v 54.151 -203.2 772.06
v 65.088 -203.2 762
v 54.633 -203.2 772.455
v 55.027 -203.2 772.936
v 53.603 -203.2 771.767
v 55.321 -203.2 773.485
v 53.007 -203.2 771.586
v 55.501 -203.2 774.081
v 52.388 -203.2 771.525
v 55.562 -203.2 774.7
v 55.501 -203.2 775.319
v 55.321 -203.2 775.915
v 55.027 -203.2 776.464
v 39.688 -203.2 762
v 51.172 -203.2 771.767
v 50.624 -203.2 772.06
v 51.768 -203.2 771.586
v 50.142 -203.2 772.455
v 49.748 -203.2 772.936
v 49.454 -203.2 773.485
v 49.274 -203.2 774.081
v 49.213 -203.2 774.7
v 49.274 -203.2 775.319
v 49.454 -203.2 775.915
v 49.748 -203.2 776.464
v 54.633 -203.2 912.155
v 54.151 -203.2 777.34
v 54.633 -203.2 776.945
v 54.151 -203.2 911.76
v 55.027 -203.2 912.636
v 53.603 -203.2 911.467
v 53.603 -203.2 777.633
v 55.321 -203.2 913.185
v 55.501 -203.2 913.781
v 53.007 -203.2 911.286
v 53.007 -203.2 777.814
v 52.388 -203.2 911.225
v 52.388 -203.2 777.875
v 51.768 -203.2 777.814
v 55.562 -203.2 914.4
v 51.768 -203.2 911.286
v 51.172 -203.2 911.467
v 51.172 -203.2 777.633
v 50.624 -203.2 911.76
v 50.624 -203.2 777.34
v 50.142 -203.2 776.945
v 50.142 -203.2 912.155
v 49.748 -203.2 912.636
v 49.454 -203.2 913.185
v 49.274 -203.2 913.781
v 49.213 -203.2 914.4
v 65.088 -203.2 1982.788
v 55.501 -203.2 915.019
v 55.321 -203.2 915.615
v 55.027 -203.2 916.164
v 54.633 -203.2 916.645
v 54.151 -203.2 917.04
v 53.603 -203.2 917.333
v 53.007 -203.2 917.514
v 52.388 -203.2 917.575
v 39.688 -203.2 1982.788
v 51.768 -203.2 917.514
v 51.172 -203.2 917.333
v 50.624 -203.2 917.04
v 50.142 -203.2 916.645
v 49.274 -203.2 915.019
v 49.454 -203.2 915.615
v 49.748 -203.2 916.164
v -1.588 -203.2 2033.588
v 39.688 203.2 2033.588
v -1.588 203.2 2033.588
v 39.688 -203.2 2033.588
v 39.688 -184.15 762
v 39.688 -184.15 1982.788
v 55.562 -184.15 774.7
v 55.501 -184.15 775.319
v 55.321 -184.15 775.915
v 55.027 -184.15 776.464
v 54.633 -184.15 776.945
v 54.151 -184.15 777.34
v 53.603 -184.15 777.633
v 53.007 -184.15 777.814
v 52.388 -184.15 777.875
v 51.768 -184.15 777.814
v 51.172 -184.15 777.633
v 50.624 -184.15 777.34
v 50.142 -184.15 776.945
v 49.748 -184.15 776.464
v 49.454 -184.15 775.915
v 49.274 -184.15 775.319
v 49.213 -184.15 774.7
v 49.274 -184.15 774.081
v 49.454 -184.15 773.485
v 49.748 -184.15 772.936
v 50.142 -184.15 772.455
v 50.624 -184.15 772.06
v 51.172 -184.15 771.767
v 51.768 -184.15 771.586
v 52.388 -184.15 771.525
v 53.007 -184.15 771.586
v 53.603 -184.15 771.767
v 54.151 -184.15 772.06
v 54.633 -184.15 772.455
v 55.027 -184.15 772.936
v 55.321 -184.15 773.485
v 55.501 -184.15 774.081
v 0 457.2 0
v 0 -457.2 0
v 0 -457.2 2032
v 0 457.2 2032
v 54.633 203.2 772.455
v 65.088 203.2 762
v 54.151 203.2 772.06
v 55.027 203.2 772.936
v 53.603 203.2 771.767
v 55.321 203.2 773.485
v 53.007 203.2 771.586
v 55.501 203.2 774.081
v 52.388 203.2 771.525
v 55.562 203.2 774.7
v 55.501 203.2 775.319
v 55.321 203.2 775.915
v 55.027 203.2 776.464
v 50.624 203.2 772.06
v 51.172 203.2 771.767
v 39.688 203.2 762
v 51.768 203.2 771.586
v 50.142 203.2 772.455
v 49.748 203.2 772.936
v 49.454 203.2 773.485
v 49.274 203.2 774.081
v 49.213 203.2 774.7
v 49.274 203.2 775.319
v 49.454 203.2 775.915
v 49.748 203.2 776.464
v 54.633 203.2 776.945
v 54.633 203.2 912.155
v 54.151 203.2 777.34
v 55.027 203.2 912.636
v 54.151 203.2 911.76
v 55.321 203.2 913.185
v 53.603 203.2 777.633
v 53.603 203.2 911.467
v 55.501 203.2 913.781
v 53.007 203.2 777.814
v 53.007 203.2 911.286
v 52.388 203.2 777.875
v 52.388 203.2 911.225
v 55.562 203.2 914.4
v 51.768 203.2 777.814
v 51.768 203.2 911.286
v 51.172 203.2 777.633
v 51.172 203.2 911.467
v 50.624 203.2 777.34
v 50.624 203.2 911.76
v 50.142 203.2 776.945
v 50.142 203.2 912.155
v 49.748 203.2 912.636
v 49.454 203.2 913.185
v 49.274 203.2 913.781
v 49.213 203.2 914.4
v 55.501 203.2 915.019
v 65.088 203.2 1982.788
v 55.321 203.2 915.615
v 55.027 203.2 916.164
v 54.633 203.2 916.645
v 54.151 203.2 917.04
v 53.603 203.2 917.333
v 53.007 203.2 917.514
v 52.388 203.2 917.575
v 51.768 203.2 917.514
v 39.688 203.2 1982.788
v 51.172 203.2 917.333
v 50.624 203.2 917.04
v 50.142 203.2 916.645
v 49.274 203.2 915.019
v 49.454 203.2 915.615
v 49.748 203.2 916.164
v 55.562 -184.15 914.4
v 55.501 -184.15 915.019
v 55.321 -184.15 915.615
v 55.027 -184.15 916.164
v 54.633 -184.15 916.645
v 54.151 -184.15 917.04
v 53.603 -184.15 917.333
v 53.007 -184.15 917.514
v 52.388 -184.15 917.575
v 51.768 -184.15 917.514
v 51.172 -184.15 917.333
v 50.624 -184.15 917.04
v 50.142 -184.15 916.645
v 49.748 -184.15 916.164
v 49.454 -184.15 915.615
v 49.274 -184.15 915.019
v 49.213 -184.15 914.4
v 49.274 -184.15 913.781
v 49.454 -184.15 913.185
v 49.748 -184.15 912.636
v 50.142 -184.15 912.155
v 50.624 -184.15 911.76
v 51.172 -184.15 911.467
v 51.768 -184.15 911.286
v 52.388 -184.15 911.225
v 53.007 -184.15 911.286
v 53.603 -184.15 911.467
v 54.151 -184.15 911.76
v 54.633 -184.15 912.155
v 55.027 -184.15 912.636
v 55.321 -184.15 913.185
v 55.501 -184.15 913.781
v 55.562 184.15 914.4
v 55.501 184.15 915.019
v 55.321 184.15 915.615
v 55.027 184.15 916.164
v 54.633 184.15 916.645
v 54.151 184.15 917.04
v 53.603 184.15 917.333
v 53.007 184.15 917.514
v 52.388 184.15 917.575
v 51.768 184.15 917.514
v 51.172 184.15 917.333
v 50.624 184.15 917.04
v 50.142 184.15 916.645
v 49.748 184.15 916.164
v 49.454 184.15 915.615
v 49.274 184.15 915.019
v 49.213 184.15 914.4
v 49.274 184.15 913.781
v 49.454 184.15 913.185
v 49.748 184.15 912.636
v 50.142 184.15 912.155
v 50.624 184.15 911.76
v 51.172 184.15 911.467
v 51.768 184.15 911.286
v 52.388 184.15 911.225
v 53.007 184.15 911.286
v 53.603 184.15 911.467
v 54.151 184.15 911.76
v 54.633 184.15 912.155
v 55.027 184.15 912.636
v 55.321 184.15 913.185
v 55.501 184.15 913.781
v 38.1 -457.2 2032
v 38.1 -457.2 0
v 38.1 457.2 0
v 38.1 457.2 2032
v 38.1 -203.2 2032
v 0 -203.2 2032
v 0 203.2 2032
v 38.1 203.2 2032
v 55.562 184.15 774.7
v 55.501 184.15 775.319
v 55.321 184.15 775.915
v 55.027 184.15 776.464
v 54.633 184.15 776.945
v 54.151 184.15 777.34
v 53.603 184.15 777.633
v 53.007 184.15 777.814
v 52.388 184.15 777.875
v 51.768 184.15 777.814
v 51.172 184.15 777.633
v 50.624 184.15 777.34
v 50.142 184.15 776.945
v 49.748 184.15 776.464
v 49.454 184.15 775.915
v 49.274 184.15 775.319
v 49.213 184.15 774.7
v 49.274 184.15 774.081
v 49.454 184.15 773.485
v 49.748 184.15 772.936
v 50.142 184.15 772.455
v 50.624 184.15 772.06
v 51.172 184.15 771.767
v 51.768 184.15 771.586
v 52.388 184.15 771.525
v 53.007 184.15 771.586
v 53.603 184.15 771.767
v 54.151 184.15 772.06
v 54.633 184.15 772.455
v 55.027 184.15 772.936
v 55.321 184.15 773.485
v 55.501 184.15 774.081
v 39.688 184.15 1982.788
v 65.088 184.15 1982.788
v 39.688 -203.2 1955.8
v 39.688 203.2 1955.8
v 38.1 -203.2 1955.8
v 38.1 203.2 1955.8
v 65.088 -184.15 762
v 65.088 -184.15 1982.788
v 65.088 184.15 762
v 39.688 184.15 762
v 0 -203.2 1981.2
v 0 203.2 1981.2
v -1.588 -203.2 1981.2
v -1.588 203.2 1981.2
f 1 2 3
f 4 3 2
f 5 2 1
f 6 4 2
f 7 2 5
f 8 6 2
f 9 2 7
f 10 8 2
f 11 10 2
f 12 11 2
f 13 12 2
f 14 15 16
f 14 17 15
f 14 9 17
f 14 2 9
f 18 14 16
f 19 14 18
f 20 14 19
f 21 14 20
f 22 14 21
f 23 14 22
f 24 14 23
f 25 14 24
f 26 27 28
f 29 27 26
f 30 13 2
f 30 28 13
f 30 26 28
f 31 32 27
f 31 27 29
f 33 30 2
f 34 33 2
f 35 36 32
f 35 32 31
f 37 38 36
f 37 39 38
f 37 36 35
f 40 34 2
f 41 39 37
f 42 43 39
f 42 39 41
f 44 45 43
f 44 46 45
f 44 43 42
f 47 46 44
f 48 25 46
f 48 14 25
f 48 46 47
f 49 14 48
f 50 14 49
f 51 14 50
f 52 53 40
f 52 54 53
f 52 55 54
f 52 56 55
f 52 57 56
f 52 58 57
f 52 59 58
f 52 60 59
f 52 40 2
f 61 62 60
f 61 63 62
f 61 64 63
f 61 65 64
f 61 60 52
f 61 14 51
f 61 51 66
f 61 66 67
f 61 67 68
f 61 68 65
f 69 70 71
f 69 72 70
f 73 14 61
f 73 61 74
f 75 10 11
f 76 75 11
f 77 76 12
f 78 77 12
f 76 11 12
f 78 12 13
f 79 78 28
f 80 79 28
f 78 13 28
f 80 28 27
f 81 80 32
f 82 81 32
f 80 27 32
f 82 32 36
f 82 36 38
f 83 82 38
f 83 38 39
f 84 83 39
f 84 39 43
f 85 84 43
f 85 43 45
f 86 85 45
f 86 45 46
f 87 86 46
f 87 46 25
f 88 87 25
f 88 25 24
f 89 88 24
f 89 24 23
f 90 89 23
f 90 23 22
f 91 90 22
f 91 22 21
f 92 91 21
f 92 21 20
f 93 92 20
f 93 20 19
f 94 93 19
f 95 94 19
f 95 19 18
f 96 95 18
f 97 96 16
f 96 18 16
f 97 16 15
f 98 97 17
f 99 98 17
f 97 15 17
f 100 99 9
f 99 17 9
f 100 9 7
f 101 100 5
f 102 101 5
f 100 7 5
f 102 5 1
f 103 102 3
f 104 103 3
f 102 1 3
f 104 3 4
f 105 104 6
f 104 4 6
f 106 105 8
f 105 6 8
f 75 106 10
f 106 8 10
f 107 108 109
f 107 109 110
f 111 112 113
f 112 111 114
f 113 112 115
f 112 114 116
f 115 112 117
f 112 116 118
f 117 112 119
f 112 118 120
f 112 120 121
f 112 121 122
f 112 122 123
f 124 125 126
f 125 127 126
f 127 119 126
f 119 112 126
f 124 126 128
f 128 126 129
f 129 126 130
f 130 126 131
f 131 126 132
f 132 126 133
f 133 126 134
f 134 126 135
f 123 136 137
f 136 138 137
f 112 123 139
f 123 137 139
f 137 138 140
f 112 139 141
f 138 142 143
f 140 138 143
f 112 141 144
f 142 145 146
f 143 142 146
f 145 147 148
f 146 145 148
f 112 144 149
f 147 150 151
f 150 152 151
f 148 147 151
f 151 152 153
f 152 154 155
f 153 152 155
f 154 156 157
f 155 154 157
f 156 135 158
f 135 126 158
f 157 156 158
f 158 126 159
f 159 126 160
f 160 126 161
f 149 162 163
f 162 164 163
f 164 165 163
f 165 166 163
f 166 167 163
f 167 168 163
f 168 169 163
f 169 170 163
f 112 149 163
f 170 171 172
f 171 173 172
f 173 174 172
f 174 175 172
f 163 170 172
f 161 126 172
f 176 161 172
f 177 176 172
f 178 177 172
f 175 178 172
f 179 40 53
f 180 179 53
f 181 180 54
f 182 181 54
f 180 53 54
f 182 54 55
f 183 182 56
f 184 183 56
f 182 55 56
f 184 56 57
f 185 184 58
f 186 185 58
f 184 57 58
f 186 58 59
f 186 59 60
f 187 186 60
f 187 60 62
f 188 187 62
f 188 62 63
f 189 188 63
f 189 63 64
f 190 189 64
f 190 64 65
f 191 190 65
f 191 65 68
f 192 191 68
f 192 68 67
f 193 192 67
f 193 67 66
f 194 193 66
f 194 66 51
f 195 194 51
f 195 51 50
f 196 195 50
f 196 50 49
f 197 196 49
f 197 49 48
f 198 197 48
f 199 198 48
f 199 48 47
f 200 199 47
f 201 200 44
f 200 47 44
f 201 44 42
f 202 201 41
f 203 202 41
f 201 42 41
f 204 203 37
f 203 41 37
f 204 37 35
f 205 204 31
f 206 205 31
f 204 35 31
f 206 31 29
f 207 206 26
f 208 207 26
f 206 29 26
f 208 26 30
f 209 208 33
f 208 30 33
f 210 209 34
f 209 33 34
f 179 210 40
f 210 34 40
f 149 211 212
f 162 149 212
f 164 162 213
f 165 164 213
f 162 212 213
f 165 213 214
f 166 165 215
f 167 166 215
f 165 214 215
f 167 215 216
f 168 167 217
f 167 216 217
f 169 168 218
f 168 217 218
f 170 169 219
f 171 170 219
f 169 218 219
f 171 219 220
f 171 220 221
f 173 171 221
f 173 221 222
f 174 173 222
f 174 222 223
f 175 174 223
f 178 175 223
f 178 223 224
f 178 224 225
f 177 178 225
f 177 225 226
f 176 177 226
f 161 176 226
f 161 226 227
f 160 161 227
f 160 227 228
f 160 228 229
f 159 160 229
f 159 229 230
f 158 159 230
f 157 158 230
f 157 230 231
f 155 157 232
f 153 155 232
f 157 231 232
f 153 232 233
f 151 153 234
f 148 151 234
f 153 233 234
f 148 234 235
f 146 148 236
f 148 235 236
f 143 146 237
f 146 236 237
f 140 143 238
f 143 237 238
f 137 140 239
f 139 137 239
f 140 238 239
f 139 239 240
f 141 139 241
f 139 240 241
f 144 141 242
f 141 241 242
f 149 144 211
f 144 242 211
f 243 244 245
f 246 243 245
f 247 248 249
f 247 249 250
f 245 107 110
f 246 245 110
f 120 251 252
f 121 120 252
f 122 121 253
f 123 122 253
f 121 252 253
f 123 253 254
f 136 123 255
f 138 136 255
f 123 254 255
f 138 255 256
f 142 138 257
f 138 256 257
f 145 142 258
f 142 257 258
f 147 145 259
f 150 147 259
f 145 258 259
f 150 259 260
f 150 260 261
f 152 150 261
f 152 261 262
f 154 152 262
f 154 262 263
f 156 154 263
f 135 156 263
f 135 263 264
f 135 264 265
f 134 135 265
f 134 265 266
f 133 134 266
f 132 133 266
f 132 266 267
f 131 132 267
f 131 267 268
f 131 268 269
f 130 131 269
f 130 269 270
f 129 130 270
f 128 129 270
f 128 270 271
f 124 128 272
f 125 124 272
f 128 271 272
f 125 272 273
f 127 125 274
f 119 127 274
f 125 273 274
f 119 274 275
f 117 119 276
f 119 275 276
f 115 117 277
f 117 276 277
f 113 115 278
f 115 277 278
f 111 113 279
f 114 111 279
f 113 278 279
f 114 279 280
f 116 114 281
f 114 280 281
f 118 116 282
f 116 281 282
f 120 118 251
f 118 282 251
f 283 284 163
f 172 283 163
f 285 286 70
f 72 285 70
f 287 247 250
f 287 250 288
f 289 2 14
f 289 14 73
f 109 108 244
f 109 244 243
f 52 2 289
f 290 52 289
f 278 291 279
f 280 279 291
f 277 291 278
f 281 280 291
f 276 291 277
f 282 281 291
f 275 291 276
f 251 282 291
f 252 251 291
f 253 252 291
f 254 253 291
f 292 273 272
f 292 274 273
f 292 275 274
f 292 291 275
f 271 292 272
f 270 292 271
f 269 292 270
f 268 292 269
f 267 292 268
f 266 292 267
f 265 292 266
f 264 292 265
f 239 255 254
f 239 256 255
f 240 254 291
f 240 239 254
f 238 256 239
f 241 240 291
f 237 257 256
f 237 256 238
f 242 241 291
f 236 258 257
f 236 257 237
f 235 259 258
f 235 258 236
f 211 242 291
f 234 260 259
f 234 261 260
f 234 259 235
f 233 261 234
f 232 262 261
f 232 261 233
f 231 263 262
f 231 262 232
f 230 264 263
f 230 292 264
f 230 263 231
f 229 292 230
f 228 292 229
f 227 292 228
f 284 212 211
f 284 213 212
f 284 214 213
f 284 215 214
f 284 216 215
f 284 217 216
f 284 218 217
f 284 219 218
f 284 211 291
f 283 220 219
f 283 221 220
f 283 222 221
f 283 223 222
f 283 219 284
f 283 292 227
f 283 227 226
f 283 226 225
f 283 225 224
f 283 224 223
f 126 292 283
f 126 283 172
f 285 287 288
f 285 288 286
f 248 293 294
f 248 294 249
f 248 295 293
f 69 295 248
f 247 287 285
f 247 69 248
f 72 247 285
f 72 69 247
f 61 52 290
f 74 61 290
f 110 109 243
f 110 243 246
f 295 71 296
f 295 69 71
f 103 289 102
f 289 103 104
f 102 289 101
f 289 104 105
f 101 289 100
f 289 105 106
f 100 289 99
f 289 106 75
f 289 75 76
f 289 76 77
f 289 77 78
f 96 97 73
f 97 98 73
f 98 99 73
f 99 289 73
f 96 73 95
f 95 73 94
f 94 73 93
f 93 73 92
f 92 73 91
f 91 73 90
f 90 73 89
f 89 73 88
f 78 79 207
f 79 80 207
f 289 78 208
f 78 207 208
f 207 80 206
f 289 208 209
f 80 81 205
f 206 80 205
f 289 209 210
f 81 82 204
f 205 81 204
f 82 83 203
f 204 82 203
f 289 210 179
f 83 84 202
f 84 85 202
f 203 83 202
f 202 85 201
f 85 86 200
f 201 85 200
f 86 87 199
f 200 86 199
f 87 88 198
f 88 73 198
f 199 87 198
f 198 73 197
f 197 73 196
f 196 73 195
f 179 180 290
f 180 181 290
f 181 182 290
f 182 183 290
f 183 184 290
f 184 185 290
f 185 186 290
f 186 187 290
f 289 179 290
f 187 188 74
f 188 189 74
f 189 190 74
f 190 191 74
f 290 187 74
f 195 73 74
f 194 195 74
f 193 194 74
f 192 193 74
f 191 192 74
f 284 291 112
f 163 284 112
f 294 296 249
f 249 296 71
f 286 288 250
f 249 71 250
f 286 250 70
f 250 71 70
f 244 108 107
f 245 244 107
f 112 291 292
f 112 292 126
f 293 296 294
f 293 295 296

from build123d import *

# Parameters (mm, degrees)
F0_W     = 914.4
F0_H     = 2032
F1_DEPTH = 38.1
F3_DEPTH = 203.2
F4_W     = 19.05
F4_H     = 1220.7875
F5_DEPTH = 25.4
F6_R     = 3.175
F7_DEPTH = 660.401


with BuildPart() as f1:
    # F0 (on Right) → F1 (new body)
    with BuildSketch(Plane.YZ):
        with Locations((0, 1016)):
            Rectangle(F0_W, F0_H)
    extrude(amount=F1_DEPTH)


with BuildPart() as f3:
    # F2 (on Front) → F3 (new body, symmetric)
    with BuildSketch(Plane.XZ):
        Polygon((-1.5875, 1981.2), (0, 1981.2), (0, 2032), (38.1, 2032), (38.1, 1955.8), (39.6875, 1955.8), (39.6875, 2033.5875), (-1.5875, 2033.5875), align=None)
    extrude(amount=F3_DEPTH, both=True)


with BuildPart() as f5:
    # F4 (on face) → F5 (new body)
    with BuildSketch(Plane.YZ.offset(39.6875)):
        with Locations((-193.675, 1372.39375)):
            Rectangle(F4_W, F4_H)
    extrude(amount=F5_DEPTH)


with BuildPart() as f5b:
    # F4 (on face) → F5, piece 2 (new body)
    with BuildSketch(Plane.YZ.offset(39.6875)):
        with Locations((193.675, 1372.39375)):
            Rectangle(F4_W, F4_H)
    extrude(amount=F5_DEPTH)


with BuildPart() as f7_tool:
    # F6 (on face) → F7 (new body, through all)
    with BuildSketch(Plane.XZ.offset(203.2)):
        with Locations((52.3875, 914.4)):
            Circle(F6_R)
        with Locations((52.3875, 774.7)):
            Circle(F6_R)
    extrude(amount=-F7_DEPTH)


with BuildPart() as f5_1:
    add(f5.part)

    # F7: cut by f7_tool
    add(f7_tool.part, mode=Mode.SUBTRACT)


with BuildPart() as f5b_1:
    add(f5b.part)

    # F7: cut by f7_tool
    add(f7_tool.part, mode=Mode.SUBTRACT)


solid = Compound([f1.part, f3.part, f5_1.part, f5b_1.part])
